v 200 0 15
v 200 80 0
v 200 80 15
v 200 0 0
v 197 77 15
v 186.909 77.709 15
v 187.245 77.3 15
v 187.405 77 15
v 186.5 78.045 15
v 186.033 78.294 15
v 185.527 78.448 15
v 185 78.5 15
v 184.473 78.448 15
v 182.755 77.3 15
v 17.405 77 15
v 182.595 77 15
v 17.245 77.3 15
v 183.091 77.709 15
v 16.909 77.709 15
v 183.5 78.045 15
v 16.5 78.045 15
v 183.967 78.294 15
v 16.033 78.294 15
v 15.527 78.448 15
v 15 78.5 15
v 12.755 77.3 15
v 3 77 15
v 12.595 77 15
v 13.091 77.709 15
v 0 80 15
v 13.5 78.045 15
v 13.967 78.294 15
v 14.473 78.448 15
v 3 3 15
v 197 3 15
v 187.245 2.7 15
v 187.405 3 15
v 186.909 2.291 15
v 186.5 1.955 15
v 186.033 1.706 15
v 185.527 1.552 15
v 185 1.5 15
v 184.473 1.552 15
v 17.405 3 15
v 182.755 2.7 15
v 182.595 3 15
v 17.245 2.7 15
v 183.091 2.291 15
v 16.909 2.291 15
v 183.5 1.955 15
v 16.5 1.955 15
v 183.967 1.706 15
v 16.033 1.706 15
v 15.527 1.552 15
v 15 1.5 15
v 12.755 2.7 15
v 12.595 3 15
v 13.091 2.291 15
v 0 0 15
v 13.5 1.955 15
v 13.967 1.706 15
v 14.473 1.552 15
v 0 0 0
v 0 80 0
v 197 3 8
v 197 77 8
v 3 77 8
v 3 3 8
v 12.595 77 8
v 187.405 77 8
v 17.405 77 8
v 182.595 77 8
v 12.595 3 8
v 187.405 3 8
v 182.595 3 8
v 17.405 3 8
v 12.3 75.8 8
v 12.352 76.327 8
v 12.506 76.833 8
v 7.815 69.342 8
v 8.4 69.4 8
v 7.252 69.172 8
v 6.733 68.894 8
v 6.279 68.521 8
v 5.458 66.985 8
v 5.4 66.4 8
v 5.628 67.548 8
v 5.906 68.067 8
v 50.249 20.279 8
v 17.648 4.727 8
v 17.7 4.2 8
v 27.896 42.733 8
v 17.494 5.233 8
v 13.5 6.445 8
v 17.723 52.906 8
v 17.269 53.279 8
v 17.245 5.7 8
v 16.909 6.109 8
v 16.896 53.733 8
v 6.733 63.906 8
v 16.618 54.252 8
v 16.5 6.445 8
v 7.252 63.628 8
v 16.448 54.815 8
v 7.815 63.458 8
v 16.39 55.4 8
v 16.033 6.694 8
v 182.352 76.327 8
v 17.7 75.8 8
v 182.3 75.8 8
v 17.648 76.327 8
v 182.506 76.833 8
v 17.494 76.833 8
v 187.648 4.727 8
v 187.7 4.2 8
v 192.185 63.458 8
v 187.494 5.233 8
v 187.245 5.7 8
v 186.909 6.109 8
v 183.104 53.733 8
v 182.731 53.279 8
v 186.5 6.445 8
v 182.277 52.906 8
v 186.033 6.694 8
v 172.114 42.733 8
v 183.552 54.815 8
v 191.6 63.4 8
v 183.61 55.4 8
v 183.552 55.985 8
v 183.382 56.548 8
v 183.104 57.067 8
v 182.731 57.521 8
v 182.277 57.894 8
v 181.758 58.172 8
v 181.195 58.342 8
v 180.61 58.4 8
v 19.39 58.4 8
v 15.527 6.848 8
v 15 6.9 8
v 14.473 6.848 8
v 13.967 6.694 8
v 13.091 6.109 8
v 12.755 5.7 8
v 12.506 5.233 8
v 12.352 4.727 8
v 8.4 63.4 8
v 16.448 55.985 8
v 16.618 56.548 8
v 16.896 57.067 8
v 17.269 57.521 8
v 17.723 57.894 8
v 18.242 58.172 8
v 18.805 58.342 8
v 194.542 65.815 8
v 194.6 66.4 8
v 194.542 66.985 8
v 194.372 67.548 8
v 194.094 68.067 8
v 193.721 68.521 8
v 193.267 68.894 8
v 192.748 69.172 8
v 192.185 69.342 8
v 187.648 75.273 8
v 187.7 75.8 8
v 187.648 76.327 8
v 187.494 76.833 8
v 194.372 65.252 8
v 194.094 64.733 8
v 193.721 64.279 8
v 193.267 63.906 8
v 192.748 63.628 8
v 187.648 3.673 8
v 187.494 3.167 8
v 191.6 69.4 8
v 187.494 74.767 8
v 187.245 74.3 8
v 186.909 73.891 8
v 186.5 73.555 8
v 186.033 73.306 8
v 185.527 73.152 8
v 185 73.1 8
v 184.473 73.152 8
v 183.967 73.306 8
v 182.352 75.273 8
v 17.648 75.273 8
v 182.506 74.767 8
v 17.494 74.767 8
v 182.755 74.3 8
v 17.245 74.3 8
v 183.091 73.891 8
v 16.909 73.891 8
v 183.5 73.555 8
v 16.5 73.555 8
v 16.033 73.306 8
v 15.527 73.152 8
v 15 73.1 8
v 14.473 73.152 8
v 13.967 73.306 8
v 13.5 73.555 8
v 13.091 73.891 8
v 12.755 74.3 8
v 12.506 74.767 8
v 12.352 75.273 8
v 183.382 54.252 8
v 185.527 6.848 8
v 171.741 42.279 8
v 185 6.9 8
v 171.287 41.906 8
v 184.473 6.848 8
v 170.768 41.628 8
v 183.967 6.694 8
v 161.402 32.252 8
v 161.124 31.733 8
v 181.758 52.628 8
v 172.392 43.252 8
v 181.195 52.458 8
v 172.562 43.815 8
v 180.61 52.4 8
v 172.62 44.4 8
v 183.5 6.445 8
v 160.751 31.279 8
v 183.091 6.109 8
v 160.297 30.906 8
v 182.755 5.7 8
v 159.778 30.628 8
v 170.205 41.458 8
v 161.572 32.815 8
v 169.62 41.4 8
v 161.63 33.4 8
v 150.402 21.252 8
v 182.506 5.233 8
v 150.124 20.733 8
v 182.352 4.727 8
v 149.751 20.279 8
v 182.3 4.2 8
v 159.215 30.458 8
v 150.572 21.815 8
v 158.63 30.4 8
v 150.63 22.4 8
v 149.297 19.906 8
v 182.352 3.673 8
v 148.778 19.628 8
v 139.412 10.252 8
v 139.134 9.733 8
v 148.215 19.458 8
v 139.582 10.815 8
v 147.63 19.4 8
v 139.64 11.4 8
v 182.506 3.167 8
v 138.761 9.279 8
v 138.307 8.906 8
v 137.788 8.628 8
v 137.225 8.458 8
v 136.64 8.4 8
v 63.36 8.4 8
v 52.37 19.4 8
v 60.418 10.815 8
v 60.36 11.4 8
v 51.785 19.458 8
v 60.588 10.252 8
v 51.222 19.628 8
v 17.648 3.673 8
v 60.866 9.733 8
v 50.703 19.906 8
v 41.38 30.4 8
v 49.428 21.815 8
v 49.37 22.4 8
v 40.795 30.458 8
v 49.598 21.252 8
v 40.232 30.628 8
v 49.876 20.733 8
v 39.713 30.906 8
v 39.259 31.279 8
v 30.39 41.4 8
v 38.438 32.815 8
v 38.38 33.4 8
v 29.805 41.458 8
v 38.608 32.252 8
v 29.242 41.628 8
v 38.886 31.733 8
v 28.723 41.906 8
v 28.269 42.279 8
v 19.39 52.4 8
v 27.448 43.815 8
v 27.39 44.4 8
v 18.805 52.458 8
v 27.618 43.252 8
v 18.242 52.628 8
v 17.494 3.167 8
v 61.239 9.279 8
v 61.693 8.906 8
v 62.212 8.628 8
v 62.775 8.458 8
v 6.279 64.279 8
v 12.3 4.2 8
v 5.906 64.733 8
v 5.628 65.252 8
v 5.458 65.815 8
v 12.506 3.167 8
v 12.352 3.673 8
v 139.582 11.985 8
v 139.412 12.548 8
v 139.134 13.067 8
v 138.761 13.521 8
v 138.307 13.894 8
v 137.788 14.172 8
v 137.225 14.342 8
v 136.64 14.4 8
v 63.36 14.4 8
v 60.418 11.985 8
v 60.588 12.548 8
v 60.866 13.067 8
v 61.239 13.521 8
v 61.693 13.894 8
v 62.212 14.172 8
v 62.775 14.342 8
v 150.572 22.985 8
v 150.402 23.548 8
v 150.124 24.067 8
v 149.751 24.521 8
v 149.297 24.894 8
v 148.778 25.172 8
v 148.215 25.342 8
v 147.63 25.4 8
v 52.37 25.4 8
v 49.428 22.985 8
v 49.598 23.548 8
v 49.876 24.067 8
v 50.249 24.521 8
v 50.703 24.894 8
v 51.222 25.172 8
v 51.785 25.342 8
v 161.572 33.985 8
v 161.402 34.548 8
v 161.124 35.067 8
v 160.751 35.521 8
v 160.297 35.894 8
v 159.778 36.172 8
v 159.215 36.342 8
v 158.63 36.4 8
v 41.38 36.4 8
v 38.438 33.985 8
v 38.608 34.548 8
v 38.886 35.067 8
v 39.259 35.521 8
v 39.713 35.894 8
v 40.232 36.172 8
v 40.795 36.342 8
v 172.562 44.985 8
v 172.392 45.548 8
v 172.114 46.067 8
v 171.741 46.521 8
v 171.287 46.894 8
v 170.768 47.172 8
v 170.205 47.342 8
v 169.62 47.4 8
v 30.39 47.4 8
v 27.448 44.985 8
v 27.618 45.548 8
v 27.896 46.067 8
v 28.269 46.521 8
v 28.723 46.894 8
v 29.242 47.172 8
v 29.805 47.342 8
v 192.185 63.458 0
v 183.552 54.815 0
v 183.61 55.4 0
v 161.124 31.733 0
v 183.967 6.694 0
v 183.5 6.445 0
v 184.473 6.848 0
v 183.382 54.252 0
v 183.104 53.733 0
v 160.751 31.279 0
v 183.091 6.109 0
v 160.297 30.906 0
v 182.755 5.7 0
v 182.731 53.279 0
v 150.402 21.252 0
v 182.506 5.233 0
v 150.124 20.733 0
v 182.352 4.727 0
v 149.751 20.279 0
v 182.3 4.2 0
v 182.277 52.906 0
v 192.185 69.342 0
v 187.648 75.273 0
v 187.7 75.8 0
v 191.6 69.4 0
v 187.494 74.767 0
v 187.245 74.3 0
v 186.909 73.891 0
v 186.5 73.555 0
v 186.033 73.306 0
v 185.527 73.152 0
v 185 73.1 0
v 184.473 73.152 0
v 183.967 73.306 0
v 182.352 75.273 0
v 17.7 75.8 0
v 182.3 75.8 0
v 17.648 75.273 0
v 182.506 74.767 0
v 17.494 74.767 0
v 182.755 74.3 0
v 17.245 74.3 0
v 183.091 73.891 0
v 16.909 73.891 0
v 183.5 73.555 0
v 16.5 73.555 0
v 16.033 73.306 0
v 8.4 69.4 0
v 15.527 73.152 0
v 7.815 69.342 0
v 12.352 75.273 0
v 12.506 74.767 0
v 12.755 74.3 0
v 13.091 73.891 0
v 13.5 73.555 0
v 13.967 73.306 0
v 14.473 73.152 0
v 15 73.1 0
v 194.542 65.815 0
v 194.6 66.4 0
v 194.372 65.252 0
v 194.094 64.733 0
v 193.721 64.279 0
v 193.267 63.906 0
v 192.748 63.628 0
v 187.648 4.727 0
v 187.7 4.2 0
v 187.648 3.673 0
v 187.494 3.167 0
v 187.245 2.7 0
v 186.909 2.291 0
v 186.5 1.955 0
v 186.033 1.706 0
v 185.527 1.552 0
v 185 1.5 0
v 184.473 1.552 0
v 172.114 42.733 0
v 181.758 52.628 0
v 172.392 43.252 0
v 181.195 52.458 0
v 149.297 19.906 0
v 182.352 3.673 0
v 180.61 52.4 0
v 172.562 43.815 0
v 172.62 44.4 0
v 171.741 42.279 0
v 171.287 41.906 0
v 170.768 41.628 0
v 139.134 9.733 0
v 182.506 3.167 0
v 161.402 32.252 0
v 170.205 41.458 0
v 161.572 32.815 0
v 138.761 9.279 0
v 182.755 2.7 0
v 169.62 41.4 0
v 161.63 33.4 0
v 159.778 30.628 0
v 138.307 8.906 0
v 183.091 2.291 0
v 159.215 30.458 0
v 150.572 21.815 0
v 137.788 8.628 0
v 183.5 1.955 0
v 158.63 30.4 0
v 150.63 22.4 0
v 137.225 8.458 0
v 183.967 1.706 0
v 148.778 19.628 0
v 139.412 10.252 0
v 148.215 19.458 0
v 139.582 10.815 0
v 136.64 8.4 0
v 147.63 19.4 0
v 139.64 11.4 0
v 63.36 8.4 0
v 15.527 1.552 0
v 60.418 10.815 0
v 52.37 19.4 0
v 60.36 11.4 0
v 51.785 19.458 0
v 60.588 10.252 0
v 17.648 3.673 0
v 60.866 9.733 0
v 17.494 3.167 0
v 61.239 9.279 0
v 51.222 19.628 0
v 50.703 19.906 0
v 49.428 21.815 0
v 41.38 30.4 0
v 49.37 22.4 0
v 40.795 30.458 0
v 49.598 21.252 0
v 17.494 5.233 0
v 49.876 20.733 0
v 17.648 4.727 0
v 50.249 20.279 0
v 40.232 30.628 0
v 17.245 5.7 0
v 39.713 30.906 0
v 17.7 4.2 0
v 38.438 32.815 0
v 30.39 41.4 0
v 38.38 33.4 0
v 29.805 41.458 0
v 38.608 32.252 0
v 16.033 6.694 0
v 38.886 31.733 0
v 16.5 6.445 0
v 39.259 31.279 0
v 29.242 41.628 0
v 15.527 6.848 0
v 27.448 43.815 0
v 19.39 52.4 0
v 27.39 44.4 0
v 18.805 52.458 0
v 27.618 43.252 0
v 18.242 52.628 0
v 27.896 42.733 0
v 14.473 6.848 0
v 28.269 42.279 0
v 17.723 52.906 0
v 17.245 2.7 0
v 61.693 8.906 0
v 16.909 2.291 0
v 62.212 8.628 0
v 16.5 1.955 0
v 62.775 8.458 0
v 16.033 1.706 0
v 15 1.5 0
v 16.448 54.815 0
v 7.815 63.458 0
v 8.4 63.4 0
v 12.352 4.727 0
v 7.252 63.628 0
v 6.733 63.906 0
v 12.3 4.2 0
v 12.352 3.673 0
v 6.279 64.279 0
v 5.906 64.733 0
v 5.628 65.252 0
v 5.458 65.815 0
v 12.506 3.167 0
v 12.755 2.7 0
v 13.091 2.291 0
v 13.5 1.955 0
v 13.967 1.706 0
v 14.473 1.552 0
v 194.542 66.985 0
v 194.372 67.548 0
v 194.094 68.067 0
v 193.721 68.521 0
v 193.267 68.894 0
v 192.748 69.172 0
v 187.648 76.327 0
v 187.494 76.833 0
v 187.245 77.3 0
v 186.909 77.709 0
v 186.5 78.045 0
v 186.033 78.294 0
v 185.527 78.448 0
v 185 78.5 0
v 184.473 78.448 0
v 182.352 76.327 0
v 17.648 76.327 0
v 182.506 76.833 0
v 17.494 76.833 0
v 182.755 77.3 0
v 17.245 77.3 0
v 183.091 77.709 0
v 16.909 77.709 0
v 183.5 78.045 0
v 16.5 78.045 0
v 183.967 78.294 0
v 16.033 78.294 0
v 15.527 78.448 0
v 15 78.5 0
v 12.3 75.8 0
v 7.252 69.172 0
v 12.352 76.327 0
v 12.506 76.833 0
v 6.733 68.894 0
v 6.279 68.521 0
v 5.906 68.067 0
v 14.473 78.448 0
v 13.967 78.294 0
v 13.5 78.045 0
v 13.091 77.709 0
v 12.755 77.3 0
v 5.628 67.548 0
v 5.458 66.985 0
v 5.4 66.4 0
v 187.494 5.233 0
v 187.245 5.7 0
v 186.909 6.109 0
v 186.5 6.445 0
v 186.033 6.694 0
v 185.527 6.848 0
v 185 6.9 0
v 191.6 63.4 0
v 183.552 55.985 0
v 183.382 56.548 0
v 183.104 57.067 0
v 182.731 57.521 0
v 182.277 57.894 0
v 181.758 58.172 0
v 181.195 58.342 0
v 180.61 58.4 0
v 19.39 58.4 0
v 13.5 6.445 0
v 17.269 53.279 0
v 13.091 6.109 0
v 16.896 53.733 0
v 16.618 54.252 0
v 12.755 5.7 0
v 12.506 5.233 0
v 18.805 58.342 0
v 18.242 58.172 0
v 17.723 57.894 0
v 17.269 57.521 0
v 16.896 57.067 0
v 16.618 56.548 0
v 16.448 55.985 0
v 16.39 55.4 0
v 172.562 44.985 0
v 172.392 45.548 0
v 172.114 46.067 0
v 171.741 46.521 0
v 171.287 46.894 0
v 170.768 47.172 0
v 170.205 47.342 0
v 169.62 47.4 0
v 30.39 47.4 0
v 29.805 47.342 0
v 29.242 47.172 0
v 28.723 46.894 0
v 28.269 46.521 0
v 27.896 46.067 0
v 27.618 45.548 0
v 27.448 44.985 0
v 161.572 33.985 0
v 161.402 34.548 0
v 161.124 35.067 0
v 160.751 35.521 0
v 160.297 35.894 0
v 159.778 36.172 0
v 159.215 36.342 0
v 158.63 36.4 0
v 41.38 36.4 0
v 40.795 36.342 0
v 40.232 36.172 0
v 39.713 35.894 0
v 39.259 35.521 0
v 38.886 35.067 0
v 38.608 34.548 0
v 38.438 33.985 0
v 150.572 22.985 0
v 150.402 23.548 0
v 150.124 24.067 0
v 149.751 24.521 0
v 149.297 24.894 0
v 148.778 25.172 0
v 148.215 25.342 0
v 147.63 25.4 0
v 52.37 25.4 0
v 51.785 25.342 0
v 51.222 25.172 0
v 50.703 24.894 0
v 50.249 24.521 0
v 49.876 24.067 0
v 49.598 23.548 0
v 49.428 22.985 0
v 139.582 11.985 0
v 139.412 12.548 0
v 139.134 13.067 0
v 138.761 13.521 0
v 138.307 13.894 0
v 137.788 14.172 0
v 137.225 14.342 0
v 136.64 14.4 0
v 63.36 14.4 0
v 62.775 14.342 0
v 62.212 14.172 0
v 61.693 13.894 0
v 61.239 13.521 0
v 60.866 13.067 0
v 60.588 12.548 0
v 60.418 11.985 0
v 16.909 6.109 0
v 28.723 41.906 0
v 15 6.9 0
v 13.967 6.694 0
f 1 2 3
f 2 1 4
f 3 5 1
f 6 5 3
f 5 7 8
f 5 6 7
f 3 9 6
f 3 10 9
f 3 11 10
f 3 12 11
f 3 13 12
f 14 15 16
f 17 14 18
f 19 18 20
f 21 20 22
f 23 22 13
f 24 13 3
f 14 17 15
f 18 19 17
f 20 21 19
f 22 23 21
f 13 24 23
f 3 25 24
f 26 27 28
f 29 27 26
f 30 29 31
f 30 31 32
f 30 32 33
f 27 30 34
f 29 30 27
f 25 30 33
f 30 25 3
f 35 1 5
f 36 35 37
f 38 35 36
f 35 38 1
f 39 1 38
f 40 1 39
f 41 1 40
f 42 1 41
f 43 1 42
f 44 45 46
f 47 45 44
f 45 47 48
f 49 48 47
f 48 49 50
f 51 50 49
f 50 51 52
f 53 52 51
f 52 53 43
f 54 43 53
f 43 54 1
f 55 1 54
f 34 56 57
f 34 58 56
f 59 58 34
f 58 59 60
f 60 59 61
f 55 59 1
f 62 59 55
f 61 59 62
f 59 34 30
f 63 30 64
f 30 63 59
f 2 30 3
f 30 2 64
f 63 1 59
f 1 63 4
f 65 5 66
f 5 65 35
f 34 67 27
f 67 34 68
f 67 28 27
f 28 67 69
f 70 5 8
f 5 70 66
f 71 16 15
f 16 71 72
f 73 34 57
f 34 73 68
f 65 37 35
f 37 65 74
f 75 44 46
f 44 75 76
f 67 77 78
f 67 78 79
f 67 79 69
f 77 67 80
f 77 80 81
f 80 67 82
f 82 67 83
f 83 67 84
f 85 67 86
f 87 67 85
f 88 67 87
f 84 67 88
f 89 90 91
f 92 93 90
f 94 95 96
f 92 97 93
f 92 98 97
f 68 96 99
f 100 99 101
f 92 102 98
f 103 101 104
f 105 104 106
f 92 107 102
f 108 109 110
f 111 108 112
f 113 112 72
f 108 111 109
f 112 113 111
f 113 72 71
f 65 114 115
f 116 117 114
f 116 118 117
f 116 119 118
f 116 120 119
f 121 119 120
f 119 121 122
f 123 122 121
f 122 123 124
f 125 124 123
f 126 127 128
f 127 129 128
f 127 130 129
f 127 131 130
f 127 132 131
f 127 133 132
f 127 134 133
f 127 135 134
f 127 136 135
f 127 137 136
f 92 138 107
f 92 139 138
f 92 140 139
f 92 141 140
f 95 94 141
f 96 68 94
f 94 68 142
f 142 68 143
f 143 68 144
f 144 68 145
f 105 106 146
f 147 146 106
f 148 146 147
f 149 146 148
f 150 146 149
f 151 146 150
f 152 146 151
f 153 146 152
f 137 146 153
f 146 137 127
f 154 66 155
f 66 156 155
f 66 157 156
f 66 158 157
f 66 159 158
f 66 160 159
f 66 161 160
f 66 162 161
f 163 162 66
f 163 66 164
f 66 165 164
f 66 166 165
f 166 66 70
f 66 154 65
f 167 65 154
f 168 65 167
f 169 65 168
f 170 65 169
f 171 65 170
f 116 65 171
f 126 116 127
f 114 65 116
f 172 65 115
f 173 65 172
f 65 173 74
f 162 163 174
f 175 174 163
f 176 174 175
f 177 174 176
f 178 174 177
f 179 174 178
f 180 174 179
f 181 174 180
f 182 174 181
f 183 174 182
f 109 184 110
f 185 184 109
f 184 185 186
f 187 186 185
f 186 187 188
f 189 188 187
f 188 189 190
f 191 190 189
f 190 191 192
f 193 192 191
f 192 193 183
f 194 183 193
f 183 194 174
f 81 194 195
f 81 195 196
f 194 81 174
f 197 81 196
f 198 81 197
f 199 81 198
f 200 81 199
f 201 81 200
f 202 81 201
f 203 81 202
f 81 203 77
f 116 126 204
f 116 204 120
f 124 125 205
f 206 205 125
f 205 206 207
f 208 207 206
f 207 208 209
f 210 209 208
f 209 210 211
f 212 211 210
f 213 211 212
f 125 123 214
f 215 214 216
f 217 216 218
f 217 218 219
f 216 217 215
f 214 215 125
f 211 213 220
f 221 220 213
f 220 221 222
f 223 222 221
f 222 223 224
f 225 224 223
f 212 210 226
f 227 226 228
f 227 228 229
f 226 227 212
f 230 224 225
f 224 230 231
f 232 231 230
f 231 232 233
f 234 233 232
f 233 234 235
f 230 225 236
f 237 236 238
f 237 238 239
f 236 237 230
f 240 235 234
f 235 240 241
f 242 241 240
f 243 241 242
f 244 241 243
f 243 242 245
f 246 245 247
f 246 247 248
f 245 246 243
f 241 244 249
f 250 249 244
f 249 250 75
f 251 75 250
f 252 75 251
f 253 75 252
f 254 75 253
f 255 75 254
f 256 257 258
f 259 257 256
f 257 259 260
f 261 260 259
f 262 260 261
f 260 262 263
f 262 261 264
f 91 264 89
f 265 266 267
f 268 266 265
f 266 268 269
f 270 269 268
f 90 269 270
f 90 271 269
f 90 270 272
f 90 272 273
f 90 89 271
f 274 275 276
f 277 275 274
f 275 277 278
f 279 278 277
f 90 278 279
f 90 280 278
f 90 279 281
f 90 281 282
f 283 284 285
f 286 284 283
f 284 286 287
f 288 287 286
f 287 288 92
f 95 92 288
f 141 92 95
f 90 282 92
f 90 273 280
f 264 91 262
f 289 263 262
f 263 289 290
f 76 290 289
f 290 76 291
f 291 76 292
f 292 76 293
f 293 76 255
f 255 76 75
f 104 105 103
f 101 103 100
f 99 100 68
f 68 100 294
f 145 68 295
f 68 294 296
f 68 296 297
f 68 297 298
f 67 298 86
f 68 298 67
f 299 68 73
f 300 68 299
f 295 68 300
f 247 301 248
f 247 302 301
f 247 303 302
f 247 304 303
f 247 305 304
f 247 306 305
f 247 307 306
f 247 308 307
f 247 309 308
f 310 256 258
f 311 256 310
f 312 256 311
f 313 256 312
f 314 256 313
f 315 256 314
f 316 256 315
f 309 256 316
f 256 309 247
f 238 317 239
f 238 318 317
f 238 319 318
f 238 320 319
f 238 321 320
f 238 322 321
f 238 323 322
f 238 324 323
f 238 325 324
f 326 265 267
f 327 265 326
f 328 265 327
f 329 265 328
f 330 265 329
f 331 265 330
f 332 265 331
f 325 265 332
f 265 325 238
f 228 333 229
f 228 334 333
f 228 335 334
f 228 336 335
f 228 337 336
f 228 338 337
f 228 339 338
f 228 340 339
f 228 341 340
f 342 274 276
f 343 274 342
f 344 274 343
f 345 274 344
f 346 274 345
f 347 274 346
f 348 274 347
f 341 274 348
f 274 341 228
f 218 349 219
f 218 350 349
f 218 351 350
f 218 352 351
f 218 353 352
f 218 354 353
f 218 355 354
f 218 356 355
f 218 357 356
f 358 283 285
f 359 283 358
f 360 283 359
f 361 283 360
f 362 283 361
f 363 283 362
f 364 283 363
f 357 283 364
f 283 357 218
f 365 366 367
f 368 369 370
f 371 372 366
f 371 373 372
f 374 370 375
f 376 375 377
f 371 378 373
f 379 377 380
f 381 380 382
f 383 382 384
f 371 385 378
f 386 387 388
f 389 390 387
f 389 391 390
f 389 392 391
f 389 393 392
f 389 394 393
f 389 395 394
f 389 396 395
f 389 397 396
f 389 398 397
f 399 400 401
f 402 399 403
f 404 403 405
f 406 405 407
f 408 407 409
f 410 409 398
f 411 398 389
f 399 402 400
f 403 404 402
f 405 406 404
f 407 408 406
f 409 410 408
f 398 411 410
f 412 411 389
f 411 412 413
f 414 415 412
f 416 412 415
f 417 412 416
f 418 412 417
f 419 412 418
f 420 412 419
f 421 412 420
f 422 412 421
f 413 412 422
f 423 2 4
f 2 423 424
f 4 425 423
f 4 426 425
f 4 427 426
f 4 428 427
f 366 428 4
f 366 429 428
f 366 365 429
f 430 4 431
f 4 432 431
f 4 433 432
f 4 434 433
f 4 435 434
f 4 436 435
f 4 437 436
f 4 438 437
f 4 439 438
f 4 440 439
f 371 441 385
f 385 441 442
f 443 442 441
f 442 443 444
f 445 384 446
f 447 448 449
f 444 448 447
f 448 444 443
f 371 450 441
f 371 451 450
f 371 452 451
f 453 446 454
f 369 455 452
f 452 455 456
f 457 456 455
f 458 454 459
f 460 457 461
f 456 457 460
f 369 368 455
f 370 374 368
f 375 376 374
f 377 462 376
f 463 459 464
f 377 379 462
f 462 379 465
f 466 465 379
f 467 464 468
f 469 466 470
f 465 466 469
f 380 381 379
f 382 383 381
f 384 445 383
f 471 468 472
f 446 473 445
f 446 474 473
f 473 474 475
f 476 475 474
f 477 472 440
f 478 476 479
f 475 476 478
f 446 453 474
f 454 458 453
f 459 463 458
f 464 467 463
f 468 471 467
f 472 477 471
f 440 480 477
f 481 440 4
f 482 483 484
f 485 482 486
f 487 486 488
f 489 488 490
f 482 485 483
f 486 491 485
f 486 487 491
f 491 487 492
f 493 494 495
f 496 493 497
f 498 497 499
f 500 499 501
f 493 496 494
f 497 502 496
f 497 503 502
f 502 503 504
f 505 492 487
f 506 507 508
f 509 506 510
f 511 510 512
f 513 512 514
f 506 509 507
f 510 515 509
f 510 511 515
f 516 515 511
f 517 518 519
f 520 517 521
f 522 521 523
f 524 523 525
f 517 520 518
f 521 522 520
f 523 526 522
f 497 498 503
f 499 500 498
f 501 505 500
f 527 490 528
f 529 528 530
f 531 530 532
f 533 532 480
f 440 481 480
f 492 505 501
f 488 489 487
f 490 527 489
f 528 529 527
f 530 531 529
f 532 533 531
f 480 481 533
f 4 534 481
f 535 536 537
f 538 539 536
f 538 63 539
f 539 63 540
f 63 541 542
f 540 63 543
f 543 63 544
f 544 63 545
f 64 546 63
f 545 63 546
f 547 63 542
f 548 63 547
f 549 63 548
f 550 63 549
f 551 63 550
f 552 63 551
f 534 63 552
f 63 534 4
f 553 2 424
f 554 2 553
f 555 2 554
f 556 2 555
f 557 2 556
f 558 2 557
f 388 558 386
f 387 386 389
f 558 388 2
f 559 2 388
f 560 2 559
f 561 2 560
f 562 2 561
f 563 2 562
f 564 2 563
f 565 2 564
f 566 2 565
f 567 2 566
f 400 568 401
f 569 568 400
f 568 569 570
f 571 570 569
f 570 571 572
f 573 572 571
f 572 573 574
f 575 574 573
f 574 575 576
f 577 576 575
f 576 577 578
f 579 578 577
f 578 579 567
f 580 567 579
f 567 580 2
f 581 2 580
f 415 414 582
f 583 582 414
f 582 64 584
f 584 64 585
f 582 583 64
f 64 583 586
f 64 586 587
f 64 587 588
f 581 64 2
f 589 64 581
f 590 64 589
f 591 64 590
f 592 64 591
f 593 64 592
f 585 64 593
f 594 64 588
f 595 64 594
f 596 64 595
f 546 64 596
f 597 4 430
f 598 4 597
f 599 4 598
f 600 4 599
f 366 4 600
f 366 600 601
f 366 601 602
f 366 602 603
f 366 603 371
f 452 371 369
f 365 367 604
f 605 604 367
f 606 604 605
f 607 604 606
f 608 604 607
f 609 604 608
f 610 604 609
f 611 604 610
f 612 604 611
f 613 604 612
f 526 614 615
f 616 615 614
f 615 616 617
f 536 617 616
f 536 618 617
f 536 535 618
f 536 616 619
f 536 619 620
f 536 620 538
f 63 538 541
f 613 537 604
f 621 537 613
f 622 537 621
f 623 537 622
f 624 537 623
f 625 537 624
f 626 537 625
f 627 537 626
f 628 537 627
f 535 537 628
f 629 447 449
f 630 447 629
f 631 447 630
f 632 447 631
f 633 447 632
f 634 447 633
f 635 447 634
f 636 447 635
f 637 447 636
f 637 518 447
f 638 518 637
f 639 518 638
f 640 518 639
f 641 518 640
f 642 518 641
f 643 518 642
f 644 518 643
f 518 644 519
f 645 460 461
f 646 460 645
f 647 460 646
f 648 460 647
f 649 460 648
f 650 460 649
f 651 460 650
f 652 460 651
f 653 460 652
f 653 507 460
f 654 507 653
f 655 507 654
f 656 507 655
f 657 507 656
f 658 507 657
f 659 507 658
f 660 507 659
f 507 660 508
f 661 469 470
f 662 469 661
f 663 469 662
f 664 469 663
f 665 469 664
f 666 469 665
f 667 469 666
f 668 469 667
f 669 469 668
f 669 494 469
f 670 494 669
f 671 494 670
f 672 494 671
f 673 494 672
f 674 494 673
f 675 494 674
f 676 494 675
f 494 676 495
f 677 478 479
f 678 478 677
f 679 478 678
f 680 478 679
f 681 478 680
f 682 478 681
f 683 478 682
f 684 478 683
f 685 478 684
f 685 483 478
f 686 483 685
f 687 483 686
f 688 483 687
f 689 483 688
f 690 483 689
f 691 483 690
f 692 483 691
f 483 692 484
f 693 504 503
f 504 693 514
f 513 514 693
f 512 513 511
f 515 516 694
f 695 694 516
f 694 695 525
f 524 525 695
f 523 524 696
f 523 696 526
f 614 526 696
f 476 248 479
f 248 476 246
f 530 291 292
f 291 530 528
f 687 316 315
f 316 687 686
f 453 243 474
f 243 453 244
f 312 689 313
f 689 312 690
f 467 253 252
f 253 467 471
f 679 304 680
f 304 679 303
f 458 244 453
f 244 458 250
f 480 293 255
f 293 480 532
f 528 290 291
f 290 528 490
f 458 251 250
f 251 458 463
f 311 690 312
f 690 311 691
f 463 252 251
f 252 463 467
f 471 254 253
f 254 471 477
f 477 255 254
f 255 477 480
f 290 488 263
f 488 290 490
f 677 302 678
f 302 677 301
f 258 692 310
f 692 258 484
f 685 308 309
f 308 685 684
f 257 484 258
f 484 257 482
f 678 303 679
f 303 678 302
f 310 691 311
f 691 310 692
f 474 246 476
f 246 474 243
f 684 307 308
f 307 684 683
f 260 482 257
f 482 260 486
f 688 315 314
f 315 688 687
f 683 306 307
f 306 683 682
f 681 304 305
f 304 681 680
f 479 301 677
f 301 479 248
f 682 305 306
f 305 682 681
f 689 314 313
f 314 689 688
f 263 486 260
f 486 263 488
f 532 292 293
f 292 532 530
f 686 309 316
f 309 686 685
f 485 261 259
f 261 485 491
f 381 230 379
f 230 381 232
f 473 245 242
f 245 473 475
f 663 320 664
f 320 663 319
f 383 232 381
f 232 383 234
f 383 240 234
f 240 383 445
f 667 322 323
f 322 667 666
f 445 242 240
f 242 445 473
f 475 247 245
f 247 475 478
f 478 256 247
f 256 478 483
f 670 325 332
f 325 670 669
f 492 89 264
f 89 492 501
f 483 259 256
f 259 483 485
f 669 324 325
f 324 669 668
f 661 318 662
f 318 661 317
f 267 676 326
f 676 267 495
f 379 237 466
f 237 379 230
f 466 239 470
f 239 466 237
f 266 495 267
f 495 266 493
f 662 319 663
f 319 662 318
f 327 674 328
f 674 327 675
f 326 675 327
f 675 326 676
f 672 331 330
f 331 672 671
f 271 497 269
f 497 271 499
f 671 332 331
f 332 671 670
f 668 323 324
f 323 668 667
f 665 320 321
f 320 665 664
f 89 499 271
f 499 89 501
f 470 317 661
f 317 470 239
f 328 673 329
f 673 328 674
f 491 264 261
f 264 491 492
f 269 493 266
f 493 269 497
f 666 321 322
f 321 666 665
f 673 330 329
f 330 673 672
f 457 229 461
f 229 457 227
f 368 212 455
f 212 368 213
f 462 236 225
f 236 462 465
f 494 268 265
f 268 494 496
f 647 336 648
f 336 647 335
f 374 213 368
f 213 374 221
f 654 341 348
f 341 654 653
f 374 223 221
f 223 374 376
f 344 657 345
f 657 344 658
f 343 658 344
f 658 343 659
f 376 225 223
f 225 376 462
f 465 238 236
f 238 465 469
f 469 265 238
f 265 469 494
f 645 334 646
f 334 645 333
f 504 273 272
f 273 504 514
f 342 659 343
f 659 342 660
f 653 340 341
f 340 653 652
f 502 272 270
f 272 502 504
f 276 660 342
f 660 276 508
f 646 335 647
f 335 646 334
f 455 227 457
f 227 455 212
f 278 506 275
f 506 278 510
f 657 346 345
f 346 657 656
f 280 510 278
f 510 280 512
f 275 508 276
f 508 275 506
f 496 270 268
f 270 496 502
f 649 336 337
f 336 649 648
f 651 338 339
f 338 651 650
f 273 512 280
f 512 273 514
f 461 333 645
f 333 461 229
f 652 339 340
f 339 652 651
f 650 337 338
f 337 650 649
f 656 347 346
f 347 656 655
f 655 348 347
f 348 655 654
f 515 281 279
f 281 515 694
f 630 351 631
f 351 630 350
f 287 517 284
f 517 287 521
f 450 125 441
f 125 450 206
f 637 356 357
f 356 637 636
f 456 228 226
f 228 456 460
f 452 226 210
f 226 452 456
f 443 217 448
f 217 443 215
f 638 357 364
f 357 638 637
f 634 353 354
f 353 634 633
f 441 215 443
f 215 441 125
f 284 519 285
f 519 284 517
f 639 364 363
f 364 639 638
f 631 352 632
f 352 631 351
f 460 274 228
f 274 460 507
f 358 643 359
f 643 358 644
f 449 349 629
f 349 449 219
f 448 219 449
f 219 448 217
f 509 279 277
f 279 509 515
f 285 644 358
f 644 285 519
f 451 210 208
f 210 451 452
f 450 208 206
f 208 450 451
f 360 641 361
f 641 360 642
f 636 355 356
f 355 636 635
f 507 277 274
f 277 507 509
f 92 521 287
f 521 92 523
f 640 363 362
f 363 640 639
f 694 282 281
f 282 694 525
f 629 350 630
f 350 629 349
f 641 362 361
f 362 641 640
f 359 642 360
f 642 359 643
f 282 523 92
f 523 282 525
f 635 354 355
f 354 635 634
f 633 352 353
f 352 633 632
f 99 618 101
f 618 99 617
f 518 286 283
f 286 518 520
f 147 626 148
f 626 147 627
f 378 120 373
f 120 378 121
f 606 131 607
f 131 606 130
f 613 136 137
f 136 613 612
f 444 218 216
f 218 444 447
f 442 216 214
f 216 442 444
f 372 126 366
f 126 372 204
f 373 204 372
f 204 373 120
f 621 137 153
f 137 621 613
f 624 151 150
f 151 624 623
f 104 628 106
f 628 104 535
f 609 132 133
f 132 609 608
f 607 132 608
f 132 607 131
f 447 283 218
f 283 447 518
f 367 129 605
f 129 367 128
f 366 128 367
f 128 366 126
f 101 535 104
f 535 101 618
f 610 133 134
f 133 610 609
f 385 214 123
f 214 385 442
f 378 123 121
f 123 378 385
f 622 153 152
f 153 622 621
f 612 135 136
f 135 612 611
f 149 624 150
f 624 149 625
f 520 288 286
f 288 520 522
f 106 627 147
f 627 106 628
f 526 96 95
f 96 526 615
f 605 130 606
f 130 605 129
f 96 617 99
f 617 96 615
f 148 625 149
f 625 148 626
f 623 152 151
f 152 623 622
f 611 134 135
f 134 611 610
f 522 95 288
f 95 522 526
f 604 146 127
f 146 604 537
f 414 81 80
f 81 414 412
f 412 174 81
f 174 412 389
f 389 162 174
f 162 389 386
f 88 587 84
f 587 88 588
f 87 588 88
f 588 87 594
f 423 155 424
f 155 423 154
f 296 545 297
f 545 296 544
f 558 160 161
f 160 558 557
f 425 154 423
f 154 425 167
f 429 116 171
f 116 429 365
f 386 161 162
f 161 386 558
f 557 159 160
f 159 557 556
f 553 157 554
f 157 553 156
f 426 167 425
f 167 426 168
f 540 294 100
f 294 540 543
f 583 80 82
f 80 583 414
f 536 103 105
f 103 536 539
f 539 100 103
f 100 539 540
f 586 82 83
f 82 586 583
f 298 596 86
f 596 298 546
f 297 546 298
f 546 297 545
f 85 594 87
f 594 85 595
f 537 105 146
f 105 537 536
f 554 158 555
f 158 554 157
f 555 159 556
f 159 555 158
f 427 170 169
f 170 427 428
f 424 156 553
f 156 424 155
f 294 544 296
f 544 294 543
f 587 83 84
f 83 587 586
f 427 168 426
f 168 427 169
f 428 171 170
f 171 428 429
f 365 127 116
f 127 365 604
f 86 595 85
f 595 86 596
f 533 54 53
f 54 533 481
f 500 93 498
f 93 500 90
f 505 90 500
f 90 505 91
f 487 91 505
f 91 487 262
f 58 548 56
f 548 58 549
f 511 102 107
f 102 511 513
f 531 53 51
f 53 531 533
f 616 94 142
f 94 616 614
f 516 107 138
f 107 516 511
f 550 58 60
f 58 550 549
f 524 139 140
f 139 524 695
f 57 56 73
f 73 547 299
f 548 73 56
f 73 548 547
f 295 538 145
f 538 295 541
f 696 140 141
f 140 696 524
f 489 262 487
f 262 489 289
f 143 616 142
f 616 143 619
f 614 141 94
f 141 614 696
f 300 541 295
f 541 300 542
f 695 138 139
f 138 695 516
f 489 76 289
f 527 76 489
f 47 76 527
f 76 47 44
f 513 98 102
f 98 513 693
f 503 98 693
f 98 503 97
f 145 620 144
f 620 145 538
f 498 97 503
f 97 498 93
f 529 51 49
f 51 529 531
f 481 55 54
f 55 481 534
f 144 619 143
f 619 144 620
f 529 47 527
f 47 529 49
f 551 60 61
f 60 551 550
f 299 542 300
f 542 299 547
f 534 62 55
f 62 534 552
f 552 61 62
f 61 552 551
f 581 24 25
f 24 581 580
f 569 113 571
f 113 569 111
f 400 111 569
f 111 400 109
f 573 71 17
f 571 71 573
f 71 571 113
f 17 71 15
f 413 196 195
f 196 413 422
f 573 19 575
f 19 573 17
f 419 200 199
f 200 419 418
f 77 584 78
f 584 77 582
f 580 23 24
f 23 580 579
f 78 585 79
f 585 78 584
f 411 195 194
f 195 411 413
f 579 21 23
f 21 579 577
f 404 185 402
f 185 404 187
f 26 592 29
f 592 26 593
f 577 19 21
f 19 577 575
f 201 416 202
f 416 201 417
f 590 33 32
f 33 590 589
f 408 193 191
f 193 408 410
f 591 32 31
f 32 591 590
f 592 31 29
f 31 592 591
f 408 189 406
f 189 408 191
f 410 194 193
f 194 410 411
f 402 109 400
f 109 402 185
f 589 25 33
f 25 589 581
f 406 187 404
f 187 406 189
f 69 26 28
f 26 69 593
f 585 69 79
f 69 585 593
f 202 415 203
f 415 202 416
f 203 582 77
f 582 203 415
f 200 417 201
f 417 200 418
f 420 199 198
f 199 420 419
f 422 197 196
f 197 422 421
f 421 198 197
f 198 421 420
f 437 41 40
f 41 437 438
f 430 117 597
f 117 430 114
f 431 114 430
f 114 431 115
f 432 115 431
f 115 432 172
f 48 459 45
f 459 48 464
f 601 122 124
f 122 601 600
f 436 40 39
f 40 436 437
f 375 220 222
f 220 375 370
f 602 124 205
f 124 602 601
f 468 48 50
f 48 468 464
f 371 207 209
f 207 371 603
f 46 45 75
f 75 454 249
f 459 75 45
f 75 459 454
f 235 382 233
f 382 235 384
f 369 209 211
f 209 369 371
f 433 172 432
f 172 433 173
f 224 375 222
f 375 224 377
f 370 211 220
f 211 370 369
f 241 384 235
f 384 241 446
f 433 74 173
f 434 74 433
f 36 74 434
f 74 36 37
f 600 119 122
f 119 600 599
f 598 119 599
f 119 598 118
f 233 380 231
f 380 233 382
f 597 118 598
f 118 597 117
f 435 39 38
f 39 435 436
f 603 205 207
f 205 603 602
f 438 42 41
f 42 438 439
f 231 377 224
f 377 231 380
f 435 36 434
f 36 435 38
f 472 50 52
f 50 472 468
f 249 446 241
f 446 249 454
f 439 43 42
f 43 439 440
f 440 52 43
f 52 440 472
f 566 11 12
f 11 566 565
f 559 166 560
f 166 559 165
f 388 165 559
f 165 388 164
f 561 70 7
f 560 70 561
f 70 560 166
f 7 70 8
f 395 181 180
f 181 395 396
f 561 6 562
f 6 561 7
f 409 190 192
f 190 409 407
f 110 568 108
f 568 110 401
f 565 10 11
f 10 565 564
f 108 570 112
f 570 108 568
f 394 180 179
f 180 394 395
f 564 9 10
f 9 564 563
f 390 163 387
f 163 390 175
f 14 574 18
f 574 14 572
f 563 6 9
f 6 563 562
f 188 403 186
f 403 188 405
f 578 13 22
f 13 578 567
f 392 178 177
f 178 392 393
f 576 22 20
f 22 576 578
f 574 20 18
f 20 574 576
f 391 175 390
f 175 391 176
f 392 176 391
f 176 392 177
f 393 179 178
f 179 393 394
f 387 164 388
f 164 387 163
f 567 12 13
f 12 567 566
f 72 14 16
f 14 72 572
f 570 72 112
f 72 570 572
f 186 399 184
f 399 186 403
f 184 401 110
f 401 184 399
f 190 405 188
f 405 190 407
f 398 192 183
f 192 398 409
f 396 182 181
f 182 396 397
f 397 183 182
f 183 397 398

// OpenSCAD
$fn = 32;

// ----------------------------------------------------------------------
// Slotted panel: 200 x 80 mm, 6 рядов of slots
// ----------------------------------------------------------------------

// --- parameters (mm) ---
panel_w = 200;            // panel width
panel_d = 80;             // panel depth
thick = 8;                // panel thickness
slot_w = 6;               // slot width
pitch0 = 11;              // first row pitch
pitch_step = 2.4;         // pitch increase per row
margin = 8.4;             // margin around the slot field
rows = 6;                 // number of slot rows
mount_d = 5.4;            // mounting holes
mount_x = 85;             // mounting hole offset
rim_h = 15;               // rim height
rim_t = 3;                // rim wall thickness

difference() {
  union() {
    cube([panel_w, panel_d, thick]);
    translate([0, 0, thick - 1]) difference() {
      cube([panel_w, panel_d, rim_h - thick + 1]);
      translate([rim_t, rim_t, -2.5]) cube([panel_w - 2 * rim_t, panel_d - 2 * rim_t, rim_h - thick + 6]);
    }
  }
  /* slot rows: stadium shaped cutters, 2.5 mm clear of both faces */
  /* row 0: pitch 11, length 73.28 */
  hull() {
    translate([63.36, 11.4, -2.5]) cylinder(h = thick + 5, d = slot_w);
    translate([136.64, 11.4, -2.5]) cylinder(h = thick + 5, d = slot_w);
  }
  /* row 1: pitch 11, length 95.26 */
  hull() {
    translate([52.37, 22.4, -2.5]) cylinder(h = thick + 5, d = slot_w);
    translate([147.63, 22.4, -2.5]) cylinder(h = thick + 5, d = slot_w);
  }
  /* row 2: pitch 11, length 117.25 */
  hull() {
    translate([41.38, 33.4, -2.5]) cylinder(h = thick + 5, d = slot_w);
    translate([158.63, 33.4, -2.5]) cylinder(h = thick + 5, d = slot_w);
  }
  /* row 3: pitch 11, length 139.23 */
  hull() {
    translate([30.39, 44.4, -2.5]) cylinder(h = thick + 5, d = slot_w);
    translate([169.62, 44.4, -2.5]) cylinder(h = thick + 5, d = slot_w);
  }
  /* row 4: pitch 11, length 161.22 */
  hull() {
    translate([19.39, 55.4, -2.5]) cylinder(h = thick + 5, d = slot_w);
    translate([180.61, 55.4, -2.5]) cylinder(h = thick + 5, d = slot_w);
  }
  /* row 5: pitch 11, length 183.2 */
  hull() {
    translate([8.4, 66.4, -2.5]) cylinder(h = thick + 5, d = slot_w);
    translate([191.6, 66.4, -2.5]) cylinder(h = thick + 5, d = slot_w);
  }
  translate([15, 4.2, -2.5]) cylinder(h = 20, d = mount_d);
  translate([15, 75.8, -2.5]) cylinder(h = 20, d = mount_d);
  translate([185, 4.2, -2.5]) cylinder(h = 20, d = mount_d);
  translate([185, 75.8, -2.5]) cylinder(h = 20, d = mount_d);
}
